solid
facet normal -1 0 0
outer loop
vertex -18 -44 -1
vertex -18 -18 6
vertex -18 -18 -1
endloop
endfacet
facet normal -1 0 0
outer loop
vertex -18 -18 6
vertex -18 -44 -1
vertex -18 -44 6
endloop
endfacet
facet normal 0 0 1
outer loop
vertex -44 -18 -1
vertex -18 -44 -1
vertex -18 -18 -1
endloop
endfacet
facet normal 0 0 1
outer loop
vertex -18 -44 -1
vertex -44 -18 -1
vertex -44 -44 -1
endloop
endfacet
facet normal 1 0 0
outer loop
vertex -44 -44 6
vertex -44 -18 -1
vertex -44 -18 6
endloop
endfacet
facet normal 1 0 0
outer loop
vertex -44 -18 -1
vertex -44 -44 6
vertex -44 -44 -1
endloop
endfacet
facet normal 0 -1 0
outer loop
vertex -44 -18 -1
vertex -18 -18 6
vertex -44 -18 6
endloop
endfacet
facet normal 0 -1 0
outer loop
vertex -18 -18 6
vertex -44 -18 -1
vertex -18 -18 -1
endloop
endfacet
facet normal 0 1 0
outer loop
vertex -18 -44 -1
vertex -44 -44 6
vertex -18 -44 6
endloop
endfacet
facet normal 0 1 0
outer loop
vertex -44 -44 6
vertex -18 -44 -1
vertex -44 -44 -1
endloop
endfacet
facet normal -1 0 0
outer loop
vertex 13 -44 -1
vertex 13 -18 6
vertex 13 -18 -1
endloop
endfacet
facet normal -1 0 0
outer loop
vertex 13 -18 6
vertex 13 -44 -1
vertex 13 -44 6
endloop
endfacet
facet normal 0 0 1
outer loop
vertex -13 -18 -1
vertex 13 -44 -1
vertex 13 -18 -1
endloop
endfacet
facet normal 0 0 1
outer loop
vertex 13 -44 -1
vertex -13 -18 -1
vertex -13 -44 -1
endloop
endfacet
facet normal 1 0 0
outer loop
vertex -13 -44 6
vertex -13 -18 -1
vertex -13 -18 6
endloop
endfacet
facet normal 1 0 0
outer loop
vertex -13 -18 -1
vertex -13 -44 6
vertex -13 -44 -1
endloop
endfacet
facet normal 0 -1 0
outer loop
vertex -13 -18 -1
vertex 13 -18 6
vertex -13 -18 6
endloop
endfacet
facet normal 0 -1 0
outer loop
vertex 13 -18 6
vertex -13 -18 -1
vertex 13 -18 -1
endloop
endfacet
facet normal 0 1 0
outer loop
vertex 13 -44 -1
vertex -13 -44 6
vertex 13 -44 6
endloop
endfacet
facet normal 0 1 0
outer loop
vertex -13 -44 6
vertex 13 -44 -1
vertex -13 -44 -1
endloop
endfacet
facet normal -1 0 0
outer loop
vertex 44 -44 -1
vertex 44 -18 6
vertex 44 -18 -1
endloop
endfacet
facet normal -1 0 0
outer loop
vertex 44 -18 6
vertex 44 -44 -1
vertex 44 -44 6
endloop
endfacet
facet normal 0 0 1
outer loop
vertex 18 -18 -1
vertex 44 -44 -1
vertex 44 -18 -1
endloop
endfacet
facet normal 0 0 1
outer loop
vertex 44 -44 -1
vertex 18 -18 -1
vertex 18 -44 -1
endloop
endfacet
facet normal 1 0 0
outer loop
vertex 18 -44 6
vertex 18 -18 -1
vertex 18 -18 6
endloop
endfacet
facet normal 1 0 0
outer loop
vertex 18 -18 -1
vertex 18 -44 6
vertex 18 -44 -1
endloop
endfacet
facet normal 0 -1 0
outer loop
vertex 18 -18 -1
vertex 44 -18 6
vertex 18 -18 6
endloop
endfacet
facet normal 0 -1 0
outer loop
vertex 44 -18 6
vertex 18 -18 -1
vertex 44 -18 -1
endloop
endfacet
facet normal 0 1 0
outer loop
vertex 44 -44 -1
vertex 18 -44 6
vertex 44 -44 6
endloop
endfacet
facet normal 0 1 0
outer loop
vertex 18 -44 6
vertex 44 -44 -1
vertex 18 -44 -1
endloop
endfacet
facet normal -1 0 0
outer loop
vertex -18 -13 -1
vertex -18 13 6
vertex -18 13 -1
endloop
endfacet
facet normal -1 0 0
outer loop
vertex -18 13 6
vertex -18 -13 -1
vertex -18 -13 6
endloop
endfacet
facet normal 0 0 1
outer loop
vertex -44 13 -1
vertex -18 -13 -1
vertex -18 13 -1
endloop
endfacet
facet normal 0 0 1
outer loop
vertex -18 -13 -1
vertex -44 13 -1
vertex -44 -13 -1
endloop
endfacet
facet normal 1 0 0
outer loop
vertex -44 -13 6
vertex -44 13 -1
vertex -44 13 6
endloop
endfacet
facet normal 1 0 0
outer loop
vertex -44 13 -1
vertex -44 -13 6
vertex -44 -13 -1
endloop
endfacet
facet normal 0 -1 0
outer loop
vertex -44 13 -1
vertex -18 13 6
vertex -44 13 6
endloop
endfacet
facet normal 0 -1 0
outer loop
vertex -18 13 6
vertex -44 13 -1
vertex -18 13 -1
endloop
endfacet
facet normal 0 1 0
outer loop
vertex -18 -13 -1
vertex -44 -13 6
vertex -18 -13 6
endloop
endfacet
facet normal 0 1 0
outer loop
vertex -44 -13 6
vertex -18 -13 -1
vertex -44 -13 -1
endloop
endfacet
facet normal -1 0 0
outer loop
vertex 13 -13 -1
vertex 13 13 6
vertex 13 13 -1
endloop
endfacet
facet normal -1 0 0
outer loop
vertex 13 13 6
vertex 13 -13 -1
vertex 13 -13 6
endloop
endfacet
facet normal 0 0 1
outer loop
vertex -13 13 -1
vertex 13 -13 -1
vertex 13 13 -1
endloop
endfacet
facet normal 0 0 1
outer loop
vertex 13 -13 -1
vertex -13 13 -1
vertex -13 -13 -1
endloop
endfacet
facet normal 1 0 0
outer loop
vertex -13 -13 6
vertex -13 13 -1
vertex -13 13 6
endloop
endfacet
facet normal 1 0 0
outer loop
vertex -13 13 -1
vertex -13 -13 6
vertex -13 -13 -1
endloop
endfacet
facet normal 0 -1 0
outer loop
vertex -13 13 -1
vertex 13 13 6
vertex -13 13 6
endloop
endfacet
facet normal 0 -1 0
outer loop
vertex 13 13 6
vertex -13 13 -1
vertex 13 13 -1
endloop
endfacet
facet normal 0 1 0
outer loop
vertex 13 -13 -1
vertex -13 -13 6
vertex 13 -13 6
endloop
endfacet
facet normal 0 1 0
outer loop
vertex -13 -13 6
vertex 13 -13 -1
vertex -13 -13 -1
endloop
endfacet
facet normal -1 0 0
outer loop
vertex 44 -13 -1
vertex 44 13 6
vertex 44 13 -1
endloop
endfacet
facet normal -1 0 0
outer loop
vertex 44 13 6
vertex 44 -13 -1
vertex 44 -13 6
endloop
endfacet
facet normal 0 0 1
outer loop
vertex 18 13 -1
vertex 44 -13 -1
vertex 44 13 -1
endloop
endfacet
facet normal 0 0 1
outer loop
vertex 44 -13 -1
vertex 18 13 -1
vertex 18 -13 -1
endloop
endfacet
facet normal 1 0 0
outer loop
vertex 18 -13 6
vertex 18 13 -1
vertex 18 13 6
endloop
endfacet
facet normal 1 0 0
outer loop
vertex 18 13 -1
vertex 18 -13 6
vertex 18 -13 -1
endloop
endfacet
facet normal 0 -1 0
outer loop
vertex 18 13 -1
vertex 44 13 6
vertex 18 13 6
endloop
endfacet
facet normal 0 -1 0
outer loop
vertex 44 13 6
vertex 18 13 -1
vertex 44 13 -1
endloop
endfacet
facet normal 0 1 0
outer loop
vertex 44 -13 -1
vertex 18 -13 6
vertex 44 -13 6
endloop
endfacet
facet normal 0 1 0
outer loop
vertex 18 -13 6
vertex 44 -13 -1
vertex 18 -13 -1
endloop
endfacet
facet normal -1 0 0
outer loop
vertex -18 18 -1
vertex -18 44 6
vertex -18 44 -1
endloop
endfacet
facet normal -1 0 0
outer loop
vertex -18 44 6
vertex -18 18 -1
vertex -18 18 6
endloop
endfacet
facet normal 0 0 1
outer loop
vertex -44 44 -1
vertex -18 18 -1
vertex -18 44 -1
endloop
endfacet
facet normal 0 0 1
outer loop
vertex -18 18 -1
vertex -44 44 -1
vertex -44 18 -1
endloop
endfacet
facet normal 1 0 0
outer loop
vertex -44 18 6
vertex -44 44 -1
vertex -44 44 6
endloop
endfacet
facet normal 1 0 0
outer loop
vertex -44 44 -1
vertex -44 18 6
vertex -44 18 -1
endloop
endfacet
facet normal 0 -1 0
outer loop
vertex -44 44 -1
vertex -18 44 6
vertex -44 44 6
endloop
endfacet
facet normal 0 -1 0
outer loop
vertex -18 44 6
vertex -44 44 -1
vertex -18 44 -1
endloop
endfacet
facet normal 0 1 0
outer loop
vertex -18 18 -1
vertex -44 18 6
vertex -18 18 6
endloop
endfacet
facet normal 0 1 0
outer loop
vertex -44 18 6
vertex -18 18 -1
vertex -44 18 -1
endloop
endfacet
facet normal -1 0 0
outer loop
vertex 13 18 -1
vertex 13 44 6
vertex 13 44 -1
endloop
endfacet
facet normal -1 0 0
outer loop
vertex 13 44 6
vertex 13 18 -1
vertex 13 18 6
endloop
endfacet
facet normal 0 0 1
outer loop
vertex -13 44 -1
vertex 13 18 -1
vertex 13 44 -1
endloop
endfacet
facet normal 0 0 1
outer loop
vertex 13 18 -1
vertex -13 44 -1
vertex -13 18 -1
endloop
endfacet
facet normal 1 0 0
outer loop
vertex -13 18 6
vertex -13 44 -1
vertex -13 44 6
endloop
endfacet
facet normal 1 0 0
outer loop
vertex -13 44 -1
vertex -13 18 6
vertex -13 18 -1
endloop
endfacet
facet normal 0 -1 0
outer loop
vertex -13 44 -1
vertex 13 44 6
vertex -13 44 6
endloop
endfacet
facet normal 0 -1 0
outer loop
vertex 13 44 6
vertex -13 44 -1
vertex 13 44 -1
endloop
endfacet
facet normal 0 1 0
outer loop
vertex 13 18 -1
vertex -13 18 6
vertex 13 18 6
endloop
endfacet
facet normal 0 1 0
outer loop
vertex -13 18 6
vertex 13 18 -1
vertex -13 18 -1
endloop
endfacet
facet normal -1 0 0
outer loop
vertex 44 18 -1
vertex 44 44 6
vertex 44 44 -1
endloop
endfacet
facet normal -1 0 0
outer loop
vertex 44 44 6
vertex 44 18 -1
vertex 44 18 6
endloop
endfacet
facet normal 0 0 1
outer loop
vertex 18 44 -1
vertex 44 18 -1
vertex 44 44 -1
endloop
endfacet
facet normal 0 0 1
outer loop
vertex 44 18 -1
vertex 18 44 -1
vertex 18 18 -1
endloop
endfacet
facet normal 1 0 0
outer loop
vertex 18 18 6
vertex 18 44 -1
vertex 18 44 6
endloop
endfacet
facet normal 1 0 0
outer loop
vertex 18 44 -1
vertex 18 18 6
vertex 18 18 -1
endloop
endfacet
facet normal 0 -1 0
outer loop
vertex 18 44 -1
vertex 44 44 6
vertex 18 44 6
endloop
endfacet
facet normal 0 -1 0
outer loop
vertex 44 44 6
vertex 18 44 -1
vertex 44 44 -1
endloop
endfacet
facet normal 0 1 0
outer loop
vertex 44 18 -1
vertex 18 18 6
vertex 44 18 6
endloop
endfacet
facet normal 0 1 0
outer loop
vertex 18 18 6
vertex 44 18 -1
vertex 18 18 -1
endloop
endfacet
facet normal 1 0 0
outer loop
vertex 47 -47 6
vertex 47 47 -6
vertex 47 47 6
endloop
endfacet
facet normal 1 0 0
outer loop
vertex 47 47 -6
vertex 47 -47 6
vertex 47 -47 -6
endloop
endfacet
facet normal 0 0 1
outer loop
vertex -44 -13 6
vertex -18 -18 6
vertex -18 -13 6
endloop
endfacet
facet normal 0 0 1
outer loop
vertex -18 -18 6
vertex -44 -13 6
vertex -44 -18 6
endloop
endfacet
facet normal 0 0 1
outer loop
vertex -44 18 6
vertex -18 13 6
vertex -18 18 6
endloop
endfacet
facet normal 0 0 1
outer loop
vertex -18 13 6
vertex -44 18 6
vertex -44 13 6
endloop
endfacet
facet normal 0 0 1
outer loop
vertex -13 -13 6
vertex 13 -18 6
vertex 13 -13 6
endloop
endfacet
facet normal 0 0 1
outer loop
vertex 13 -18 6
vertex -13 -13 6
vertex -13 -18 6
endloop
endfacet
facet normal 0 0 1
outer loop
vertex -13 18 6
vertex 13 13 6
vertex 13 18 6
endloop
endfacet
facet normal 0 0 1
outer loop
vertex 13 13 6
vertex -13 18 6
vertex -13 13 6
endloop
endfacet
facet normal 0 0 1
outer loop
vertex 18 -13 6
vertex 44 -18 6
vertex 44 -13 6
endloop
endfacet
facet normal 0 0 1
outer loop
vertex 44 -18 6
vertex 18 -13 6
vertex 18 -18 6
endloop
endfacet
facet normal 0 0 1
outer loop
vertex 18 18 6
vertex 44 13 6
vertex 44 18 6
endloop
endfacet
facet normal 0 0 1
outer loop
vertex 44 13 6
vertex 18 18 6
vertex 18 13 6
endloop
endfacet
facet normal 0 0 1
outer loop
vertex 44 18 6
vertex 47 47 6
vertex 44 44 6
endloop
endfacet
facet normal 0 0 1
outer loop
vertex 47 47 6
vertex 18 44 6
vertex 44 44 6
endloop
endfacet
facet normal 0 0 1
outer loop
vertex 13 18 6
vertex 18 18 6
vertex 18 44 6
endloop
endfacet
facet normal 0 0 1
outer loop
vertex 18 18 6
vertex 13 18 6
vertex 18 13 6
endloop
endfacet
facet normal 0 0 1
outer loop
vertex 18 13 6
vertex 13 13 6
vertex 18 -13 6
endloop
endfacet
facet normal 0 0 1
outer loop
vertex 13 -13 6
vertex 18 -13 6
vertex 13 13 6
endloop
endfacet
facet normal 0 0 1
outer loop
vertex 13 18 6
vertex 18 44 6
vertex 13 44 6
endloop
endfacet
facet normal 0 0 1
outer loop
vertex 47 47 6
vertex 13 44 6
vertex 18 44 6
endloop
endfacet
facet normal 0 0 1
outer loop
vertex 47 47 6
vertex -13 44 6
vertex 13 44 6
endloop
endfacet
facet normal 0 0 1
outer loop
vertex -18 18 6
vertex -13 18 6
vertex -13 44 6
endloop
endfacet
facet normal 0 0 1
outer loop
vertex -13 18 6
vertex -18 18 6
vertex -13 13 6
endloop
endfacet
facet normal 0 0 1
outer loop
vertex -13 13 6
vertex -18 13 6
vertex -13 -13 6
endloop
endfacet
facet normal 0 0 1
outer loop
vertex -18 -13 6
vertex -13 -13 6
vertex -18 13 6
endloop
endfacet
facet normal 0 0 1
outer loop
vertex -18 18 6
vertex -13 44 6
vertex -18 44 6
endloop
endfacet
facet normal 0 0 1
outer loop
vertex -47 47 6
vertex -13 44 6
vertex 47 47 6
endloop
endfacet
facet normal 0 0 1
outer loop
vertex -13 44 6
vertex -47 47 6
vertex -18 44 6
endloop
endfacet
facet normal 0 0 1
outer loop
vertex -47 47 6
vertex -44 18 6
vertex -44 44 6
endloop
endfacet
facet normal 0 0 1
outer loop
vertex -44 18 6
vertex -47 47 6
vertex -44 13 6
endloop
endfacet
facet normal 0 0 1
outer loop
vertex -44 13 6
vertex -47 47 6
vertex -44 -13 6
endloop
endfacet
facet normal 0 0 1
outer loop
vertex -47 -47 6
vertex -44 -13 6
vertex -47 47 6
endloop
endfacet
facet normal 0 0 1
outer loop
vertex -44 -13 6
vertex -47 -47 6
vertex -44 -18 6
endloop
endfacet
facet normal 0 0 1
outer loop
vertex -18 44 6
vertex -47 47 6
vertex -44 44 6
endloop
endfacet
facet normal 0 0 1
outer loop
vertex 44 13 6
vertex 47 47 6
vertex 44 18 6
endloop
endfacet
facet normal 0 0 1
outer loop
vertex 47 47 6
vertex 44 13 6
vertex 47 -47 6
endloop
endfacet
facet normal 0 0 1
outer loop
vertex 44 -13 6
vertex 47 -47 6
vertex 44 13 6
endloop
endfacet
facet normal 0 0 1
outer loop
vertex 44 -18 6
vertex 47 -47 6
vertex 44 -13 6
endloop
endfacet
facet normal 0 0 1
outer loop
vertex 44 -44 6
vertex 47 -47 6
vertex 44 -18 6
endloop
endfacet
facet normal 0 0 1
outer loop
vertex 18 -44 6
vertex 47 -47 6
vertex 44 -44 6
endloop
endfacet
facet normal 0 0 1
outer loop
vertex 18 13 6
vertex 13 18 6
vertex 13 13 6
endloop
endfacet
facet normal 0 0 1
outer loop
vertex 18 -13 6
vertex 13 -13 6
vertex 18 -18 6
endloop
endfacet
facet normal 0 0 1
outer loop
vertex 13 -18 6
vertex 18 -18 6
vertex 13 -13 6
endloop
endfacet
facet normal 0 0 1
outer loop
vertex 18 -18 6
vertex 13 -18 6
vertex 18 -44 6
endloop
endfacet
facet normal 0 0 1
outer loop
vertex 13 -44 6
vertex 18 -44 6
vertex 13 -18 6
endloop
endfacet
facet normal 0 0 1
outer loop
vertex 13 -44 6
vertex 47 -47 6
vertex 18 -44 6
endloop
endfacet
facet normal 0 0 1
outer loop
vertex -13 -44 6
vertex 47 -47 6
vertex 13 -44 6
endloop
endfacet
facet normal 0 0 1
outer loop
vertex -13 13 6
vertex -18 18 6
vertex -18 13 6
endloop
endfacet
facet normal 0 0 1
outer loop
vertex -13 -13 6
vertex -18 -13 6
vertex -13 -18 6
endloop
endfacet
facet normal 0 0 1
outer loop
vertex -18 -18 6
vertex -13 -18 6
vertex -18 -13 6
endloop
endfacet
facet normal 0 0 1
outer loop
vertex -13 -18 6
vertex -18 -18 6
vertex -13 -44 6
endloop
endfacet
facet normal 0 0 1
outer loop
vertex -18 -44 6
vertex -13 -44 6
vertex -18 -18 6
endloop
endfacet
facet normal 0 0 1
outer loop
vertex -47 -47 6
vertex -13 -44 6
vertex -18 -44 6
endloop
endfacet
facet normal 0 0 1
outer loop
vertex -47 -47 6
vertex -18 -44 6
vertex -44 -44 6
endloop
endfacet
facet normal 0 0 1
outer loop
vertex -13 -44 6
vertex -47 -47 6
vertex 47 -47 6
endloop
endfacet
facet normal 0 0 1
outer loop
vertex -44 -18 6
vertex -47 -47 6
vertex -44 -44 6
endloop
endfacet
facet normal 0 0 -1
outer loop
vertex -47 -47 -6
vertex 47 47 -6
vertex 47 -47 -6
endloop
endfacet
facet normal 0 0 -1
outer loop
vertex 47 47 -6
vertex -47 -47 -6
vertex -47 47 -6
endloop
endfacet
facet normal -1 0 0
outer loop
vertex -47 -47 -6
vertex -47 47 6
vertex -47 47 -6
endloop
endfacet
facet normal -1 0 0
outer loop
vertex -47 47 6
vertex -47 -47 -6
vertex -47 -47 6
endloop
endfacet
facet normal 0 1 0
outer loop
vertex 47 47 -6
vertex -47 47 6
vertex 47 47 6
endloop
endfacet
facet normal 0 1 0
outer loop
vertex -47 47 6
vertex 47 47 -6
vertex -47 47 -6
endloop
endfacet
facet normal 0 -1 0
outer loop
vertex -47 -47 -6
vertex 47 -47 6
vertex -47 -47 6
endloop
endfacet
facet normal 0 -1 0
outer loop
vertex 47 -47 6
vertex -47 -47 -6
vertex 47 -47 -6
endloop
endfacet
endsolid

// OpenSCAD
$fn = 32;

// ----------------------------------------------------------------------
// Pocket plate 94 x 94 x 12
// 3 x 3 pockets 26 mm square, 7 mm deep
// ----------------------------------------------------------------------

// --- parameters (mm) ---
thickness = 12;  // plate thickness
floor_t = 5;     // material left under each pocket
pocket = 26;     // pocket side length
pitch_x = 31;    // pocket pitch along X
pitch_y = 31;    // pocket pitch along Y
cols = 3;        // pockets per row
rows = 3;        // rows of pockets

// --- derived feature positions (mm) ---
depth = thickness - floor_t;        // = 7   pocket depth, down to the floor
span_x = (cols - 1) * pitch_x;      // = 62   distance between outer pockets
span_y = (rows - 1) * pitch_y;      // = 62   distance between outer pocket rows
origin_x = -span_x / 2;             // = -31   X of the first pocket
origin_y = -span_y / 2;             // = -31   Y of the first pocket
plate = [span_x + pocket + 6, span_y + pocket + 6, thickness];  // = [94, 94, 12]   overall size: pockets plus 3 mm of wall on each side
feature_centers = [
  [origin_x + 0 * pitch_x, origin_y + 0 * pitch_y],
  [origin_x + 1 * pitch_x, origin_y + 0 * pitch_y],
  [origin_x + 2 * pitch_x, origin_y + 0 * pitch_y],
  [origin_x + 0 * pitch_x, origin_y + 1 * pitch_y],
  [origin_x + 1 * pitch_x, origin_y + 1 * pitch_y],
  [origin_x + 2 * pitch_x, origin_y + 1 * pitch_y],
  [origin_x + 0 * pitch_x, origin_y + 2 * pitch_y],
  [origin_x + 1 * pitch_x, origin_y + 2 * pitch_y],
  [origin_x + 2 * pitch_x, origin_y + 2 * pitch_y]
];   // pocket centres, used verbatim by the cutter loop

// plate outline, then one pocket per centre in feature_centers
difference() {
  cube(plate, center = true);
  for (centre = feature_centers)
    translate([centre[0] - pocket / 2, centre[1] - pocket / 2, plate[2] / 2 - depth])
      cube([pocket, pocket, depth + 1]);  // centred on the declared pocket centre
}
